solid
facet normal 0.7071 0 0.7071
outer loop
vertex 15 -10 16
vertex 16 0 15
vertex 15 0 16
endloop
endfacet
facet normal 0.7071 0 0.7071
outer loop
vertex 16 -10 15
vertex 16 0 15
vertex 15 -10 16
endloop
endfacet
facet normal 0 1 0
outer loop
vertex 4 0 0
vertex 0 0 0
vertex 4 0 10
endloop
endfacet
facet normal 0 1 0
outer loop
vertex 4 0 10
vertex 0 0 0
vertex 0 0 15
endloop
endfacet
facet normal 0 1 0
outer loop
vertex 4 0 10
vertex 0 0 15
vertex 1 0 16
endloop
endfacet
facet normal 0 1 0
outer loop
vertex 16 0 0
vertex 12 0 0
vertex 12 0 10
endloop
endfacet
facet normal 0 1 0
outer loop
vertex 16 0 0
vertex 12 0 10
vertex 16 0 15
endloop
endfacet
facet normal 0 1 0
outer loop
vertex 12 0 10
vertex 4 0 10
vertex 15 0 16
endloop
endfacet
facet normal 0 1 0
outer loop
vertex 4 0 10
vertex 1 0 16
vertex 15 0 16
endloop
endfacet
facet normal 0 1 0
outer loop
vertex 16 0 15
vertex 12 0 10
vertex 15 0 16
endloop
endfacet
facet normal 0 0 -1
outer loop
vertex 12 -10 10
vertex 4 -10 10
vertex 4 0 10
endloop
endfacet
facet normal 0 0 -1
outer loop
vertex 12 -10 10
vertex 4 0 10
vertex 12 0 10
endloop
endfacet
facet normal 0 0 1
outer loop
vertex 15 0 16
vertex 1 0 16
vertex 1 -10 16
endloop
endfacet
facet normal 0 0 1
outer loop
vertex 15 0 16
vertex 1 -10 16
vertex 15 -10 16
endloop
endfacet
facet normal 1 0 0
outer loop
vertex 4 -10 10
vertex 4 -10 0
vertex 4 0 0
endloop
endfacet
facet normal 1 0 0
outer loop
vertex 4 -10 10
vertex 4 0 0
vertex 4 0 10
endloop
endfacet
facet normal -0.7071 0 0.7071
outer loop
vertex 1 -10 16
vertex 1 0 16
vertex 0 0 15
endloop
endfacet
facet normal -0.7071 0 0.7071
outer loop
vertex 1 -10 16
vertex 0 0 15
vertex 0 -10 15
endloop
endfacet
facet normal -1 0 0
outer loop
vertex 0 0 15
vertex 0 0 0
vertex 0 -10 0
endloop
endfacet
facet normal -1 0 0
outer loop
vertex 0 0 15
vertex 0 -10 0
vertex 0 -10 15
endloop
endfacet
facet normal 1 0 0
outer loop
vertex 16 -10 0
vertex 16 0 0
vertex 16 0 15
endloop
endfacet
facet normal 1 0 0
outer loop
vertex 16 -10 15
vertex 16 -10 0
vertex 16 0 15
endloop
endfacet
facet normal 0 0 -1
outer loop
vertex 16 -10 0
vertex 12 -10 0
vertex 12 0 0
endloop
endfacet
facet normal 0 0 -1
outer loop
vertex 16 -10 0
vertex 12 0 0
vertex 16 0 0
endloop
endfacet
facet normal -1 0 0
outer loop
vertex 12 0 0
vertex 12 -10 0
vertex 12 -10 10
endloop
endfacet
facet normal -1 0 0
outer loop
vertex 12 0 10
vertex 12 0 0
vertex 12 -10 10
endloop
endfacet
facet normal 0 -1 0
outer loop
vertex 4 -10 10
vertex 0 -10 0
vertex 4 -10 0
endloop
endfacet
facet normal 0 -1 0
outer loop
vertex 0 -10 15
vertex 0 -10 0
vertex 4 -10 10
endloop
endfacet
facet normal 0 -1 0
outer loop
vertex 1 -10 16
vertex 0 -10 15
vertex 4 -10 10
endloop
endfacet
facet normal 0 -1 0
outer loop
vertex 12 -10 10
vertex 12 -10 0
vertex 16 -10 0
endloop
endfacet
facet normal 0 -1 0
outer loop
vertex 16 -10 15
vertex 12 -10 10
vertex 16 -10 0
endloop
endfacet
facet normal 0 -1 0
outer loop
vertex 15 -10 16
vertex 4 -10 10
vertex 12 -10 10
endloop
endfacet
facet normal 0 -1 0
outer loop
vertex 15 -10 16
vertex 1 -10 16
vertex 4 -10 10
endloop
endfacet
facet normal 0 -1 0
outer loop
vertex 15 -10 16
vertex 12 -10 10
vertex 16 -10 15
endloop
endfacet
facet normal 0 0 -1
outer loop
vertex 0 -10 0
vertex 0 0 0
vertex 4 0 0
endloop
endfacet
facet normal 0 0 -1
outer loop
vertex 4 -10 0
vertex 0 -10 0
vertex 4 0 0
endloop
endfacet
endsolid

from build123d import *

# Parameters (mm, degrees)
F0_W     = 16
F0_H     = 16
F1_DEPTH = 10
F2_W     = 8
F2_H     = 10
F3_DEPTH = 10.001
F4_SIZE  = 1


with BuildPart() as f1:
    # F0 (on Front) → F1 (new body)
    with BuildSketch(Plane.XZ):
        with Locations((8, 8)):
            Rectangle(F0_W, F0_H)
    extrude(amount=F1_DEPTH)

    # F2 (on face) → F3 (cut, through all)
    with BuildSketch(Plane.XZ.offset(10)):
        with Locations((8, 5)):
            Rectangle(F2_W, F2_H)
    extrude(amount=-F3_DEPTH, mode=Mode.SUBTRACT)

    # F4
    f4_edges = [f1.edges().sort_by_distance(p)[0] for p in [
        (0, -5, 16),
        (16, -5, 16),
    ]]
    chamfer(f4_edges, length=F4_SIZE)


solid = f1.part
